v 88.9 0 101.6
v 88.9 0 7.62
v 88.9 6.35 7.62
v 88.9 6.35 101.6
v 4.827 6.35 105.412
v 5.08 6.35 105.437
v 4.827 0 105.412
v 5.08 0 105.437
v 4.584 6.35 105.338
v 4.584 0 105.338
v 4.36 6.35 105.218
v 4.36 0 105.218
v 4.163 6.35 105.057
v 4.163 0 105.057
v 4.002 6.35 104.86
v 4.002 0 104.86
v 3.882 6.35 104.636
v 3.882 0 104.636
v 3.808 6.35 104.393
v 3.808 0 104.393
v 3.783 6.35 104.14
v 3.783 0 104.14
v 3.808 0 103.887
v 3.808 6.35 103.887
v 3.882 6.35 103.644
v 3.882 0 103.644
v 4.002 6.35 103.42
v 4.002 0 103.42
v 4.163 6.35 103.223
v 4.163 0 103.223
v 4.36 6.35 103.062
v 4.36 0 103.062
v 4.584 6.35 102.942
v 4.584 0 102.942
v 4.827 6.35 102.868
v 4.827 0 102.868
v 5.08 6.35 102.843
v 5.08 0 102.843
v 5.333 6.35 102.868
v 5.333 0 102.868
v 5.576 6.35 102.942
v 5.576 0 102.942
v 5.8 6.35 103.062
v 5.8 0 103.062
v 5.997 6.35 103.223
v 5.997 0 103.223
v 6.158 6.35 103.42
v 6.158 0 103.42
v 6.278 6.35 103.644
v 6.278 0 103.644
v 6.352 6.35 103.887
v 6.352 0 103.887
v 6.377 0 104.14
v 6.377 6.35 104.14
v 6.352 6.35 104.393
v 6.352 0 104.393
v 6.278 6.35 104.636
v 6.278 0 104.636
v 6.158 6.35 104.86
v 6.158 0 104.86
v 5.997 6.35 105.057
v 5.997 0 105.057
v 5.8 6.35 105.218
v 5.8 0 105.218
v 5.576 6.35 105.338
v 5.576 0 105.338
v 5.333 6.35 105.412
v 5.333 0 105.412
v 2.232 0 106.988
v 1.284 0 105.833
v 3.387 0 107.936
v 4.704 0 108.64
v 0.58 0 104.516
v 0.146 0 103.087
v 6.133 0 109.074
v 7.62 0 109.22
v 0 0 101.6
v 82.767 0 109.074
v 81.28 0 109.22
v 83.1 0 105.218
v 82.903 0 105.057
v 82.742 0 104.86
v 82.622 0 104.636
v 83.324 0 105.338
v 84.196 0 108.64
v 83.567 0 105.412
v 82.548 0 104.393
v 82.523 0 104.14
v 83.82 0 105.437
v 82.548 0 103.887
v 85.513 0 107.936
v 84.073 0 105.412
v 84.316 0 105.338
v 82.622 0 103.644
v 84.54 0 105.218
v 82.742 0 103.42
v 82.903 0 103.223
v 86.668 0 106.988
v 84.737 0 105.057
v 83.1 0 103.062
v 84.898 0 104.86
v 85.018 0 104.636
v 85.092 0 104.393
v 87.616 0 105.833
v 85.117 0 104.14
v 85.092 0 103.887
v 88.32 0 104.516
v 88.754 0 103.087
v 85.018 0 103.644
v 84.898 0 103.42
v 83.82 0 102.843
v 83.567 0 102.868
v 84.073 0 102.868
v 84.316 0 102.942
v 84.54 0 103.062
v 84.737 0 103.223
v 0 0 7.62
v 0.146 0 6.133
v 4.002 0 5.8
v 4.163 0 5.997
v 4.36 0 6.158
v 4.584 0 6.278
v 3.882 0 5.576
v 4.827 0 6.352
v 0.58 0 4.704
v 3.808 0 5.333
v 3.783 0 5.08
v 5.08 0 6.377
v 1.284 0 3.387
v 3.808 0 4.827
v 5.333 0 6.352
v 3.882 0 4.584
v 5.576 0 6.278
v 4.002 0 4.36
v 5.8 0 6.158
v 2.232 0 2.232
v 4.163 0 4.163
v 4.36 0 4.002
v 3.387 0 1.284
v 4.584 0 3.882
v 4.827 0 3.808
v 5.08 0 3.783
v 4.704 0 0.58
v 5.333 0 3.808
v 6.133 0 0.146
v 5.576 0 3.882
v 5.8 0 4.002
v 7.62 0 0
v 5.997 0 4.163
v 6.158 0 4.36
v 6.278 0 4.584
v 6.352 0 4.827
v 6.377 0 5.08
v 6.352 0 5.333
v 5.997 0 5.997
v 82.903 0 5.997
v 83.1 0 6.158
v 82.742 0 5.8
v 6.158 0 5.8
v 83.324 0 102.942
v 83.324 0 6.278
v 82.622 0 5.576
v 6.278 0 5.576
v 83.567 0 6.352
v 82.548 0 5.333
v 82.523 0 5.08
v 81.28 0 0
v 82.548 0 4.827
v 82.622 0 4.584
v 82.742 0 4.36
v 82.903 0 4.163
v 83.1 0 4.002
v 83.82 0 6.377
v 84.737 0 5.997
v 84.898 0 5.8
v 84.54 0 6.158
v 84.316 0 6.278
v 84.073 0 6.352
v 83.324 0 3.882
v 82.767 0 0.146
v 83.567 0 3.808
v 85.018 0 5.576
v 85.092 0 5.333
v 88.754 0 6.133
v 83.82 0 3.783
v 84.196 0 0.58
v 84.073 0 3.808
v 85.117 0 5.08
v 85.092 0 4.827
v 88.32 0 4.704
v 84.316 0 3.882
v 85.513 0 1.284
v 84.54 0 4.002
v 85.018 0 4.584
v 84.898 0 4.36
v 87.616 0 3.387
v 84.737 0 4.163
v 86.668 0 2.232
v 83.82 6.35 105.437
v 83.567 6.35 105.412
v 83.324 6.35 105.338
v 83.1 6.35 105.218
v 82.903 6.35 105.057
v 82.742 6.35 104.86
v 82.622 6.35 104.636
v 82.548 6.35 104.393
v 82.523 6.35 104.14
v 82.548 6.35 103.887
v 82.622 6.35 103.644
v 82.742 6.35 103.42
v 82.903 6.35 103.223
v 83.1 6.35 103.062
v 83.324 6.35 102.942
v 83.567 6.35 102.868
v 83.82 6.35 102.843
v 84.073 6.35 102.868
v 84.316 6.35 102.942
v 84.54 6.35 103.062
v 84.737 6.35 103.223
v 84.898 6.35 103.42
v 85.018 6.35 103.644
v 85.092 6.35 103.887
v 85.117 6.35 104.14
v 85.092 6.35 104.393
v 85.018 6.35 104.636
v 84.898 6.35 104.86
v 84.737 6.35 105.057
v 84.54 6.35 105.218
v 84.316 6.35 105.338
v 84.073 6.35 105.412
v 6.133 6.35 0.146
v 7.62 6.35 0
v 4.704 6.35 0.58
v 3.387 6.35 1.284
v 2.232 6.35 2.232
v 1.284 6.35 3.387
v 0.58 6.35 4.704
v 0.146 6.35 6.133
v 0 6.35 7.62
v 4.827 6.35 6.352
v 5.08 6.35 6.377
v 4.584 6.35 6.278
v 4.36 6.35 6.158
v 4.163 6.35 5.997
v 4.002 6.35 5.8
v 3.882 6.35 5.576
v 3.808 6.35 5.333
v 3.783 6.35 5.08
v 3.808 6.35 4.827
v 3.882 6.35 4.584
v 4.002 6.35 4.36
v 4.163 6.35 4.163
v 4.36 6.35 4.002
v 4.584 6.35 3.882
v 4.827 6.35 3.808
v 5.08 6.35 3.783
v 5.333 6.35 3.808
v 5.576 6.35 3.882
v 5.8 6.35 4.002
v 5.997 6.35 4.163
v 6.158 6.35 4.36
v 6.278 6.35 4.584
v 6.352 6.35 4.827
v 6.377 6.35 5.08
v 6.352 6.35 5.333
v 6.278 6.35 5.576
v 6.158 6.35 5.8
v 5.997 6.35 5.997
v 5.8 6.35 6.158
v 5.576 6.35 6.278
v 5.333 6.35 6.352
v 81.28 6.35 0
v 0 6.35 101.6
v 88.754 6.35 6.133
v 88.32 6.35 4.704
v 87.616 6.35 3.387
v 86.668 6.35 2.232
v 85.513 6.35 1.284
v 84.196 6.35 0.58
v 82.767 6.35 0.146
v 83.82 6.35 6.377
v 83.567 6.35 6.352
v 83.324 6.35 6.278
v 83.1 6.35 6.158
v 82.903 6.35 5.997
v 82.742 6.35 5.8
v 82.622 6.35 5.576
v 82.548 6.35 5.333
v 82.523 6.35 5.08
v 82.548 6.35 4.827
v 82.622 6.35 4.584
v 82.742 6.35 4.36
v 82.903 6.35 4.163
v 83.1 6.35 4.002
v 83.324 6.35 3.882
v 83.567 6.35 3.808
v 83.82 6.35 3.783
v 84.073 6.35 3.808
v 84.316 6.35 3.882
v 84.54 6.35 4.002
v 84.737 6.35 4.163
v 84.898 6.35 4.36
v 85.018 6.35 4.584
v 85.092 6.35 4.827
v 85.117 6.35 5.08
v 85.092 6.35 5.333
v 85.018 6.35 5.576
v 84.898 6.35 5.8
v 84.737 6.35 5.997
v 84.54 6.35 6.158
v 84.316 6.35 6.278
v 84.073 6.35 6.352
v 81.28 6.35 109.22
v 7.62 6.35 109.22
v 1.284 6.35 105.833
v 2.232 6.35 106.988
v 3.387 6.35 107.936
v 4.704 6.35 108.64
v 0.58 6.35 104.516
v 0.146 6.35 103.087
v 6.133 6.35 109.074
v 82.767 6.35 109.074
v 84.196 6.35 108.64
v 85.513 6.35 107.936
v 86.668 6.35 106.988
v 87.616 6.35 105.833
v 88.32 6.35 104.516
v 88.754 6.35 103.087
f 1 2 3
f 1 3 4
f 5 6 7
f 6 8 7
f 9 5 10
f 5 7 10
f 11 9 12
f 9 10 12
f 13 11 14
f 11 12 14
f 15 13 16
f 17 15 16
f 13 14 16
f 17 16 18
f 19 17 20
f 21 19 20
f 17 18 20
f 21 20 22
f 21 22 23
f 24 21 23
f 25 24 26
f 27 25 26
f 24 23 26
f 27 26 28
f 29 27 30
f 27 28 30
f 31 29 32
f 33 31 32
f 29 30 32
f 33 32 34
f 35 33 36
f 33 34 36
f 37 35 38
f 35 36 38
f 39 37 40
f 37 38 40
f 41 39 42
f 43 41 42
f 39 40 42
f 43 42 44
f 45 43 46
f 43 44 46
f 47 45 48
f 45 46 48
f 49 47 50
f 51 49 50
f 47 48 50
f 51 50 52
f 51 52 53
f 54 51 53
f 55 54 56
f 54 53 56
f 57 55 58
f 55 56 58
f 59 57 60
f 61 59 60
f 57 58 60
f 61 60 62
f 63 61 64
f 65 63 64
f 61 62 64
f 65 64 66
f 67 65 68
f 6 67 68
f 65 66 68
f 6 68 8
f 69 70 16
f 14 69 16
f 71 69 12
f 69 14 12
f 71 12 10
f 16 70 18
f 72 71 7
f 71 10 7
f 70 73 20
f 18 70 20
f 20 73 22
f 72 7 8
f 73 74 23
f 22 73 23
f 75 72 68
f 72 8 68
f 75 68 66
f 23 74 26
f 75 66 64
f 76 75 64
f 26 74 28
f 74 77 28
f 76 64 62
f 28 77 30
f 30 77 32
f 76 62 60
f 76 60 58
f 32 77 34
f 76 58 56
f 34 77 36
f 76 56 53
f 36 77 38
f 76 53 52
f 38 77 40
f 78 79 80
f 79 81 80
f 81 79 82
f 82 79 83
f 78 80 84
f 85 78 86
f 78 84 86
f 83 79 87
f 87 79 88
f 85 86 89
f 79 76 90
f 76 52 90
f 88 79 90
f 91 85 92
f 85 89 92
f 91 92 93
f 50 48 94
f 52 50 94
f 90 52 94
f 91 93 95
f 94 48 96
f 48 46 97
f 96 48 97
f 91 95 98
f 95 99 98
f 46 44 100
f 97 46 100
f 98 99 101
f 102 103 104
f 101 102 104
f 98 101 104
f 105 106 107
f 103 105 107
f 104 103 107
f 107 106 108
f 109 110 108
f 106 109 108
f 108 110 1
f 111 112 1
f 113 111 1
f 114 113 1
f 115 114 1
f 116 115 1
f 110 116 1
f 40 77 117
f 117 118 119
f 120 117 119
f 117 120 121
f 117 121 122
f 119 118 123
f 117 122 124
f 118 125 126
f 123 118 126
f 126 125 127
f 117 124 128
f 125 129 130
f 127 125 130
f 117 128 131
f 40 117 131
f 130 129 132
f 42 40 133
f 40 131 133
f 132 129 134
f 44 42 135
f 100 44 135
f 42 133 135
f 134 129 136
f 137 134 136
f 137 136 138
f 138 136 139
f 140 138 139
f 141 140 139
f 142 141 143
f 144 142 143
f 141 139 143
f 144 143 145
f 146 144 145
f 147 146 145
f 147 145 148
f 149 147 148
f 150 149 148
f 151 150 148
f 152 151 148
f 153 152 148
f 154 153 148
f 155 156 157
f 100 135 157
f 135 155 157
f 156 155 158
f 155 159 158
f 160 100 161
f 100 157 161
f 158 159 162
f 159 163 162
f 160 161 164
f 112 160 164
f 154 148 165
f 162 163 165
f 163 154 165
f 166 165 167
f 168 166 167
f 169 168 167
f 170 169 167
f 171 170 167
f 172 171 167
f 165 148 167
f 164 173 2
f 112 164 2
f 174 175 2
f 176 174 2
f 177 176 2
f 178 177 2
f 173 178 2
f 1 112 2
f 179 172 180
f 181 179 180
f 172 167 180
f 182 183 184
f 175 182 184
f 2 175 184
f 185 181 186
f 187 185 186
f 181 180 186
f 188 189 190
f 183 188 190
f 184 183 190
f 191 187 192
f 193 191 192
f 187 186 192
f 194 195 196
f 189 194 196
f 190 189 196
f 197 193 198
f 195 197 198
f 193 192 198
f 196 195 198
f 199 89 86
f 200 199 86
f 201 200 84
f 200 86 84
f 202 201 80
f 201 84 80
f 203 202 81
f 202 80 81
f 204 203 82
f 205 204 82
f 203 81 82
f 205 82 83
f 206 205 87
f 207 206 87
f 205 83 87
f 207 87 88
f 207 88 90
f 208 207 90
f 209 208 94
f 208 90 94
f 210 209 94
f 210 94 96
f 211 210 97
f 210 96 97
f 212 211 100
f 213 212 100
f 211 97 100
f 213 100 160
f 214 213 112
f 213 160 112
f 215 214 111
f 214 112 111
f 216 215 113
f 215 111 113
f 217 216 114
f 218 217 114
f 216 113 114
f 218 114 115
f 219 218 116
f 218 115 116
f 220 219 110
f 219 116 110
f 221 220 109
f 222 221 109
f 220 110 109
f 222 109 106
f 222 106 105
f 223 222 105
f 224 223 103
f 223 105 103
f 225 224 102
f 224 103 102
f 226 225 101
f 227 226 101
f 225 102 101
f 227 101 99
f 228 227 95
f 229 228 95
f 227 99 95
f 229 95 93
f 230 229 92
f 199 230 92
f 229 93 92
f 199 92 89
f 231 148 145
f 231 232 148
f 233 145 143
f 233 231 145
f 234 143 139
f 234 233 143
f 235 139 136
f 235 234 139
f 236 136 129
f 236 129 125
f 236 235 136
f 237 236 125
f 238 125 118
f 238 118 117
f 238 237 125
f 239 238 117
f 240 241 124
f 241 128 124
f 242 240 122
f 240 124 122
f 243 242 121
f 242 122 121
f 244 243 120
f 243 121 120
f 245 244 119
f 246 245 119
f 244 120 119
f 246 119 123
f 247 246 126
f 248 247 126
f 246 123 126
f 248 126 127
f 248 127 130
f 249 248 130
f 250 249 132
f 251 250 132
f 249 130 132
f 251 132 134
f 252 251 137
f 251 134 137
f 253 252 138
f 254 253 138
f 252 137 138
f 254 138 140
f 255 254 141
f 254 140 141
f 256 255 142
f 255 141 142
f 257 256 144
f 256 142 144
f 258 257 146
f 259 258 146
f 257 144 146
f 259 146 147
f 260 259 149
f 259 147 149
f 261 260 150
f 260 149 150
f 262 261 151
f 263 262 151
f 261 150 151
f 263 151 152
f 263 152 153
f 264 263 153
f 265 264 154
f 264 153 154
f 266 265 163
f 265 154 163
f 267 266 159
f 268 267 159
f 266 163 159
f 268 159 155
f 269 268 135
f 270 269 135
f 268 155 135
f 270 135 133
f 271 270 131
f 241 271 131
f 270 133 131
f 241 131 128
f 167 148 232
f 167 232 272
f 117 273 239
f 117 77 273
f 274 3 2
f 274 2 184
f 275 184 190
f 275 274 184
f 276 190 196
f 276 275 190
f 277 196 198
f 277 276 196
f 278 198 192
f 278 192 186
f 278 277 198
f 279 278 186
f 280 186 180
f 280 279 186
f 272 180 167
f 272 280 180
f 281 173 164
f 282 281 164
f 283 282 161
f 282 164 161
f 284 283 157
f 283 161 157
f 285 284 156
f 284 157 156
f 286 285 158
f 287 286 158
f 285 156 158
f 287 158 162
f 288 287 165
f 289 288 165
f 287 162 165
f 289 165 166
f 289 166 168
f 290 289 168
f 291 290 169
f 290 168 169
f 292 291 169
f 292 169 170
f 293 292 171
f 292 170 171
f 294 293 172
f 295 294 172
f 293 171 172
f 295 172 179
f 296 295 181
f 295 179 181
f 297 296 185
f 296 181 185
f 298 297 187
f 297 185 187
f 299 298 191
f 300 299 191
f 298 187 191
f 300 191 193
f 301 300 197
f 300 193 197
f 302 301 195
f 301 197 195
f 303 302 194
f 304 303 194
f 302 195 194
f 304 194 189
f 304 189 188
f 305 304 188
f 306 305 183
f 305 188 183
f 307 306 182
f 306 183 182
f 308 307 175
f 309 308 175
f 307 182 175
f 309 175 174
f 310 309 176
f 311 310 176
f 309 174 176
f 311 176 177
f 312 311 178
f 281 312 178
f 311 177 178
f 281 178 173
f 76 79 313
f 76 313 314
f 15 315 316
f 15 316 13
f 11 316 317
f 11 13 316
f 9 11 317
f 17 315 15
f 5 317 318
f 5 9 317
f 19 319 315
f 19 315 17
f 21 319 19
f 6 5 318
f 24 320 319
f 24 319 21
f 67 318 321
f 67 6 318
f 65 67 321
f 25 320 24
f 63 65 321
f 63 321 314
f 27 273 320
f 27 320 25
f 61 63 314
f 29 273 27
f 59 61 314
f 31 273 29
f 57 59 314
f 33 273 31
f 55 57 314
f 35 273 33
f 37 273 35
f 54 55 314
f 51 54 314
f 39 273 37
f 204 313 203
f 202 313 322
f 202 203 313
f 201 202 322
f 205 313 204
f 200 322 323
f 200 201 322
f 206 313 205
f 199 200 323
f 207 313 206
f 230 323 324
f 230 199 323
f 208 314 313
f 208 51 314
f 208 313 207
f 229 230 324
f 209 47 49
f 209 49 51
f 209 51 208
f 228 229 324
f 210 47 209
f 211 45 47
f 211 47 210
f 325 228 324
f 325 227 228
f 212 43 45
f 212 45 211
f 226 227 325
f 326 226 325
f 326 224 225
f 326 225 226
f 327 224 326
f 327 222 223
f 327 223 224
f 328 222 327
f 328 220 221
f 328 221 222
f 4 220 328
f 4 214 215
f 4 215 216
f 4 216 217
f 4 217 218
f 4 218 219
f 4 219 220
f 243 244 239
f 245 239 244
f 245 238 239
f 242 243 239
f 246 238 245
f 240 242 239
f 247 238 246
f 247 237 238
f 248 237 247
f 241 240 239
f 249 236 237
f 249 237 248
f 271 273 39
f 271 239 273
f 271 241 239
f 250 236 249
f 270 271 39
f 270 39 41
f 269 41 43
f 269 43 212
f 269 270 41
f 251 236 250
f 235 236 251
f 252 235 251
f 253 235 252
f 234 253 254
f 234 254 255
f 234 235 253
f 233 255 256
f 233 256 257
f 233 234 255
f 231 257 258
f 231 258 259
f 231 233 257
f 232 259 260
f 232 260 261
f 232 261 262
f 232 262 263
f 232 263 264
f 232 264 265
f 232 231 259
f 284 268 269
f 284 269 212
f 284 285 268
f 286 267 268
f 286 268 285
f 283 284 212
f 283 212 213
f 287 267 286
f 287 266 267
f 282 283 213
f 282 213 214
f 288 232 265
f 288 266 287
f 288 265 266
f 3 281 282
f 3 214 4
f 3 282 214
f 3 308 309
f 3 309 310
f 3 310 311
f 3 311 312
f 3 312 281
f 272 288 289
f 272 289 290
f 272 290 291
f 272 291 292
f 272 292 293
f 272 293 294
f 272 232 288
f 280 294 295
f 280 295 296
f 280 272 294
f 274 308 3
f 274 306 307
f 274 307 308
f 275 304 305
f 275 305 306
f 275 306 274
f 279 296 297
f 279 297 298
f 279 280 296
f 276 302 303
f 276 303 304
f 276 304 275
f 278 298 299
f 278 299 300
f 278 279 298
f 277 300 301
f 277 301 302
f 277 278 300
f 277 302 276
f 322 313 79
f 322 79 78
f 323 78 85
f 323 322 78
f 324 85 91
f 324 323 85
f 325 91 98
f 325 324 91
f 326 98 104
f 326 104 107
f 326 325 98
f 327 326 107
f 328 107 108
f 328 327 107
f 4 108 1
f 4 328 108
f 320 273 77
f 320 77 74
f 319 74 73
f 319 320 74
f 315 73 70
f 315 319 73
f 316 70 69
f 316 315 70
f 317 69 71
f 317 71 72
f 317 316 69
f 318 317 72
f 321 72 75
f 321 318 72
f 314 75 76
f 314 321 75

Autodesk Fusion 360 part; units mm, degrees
sketch "Sketch1" plane through (0, 0, 0) normal (0, 1, 0) x (1, 0, 0)
  line L0 (0, 0) -> (88.9, 0)
  line L1 (88.9, 0) -> (88.9, -109.22)
  line L2 (88.9, -109.22) -> (0, -109.22)
  line L3 (0, -109.22) -> (0, 0)
  dimension "d1" = 88.9
  dimension "d2" = 109.22
extrude "Extrude1" add sketch "Sketch1" along normal blind 6.35
fillet "Fillet1" radius 7.62 4 edges at (88.9, 3.175, 0) (0, 3.175, 0) (88.9, 3.175, 109.22) (0, 3.175, 109.22)
sketch "Sketch2" plane through (0, 6.35, 0) normal (0, 1, 0) x (-1, 0, 0)
  arc A0 (0, 101.6) -> (-7.62, 109.22) centre (-7.62, 101.6) ccw
  line L0 (-7.62, 109.22) -> (-81.28, 109.22)
  arc A1 (-81.28, 109.22) -> (-88.9, 101.6) centre (-81.28, 101.6) ccw
  line L1 (-88.9, 101.6) -> (-88.9, 7.62)
  arc A2 (-88.9, 7.62) -> (-81.28, 0) centre (-81.28, 7.62) ccw
  line L2 (-81.28, 0) -> (-7.62, 0)
  arc A3 (-7.62, 0) -> (0, 7.62) centre (-7.62, 7.62) ccw
  line L3 (0, 7.62) -> (0, 101.6)
  line L4 (-63.8008, 109.22) -> (-63.8008, 101.6)
  line L5 (-88.9, 94.0515) -> (-81.28, 94.0515)
  line L6 (-81.28, 101.6) -> (-7.62, 101.6)
  line L7 (-7.62, 101.6) -> (-7.62, 7.62)
  line L8 (-7.62, 7.62) -> (-81.28, 7.62)
  line L9 (-81.28, 7.62) -> (-81.28, 101.6)
  line L10 (-7.62, 7.62) -> (-5.08, 5.08)
hole "Hole1" at (5.08, 6.35, 5.08) direction (0, -1, 0) diameter 3.175 end through all
sketch "Sketch3" plane through (0, 6.35, 0) normal (0, 1, 0) x (-1, 0, 0)
  circle A0 centre (-5.08, 5.08) radius 1.5875
  arc A1 (0, 101.6) -> (-7.62, 109.22) centre (-7.62, 101.6) ccw
  line L0 (-7.62, 109.22) -> (-81.28, 109.22)
  arc A2 (-81.28, 109.22) -> (-88.9, 101.6) centre (-81.28, 101.6) ccw
  line L1 (-88.9, 101.6) -> (-88.9, 7.62)
  arc A3 (-88.9, 7.62) -> (-81.28, 0) centre (-81.28, 7.62) ccw
  line L2 (-81.28, 0) -> (-7.62, 0)
  arc A4 (-7.62, 0) -> (0, 7.62) centre (-7.62, 7.62) ccw
  line L3 (0, 7.62) -> (0, 101.6)
  line L4 (-50.8, 0) -> (-50.8, 7.62)
  line L5 (-88.9, 22.8139) -> (-81.28, 22.8139)
  line L6 (-81.28, 7.62) -> (-7.62, 7.62)
  line L7 (-7.62, 7.62) -> (-7.62, 101.6)
  line L8 (-7.62, 101.6) -> (-81.28, 101.6)
  line L9 (-81.28, 101.6) -> (-81.28, 7.62)
  line L10 (-81.28, 7.62) -> (-83.82, 5.08)
  line L11 (-7.62, 101.6) -> (-5.08, 104.14)
  line L12 (-81.28, 101.6) -> (-83.82, 104.14)
hole "Hole2" at (83.82, 6.35, 5.08) direction (0, -1, 0) diameter 3.175 end through all
sketch "Sketch4" plane through (0, 6.35, 0) normal (0, 1, 0) x (-1, 0, 0)
  circle A0 centre (-83.82, 5.08) radius 1.5875
  circle A1 centre (-5.08, 5.08) radius 1.5875
  arc A2 (0, 101.6) -> (-7.62, 109.22) centre (-7.62, 101.6) ccw
  line L0 (-7.62, 109.22) -> (-81.28, 109.22)
  arc A3 (-81.28, 109.22) -> (-88.9, 101.6) centre (-81.28, 101.6) ccw
  line L1 (-88.9, 101.6) -> (-88.9, 7.62)
  arc A4 (-88.9, 7.62) -> (-81.28, 0) centre (-81.28, 7.62) ccw
  line L2 (-81.28, 0) -> (-7.62, 0)
  arc A5 (-7.62, 0) -> (0, 7.62) centre (-7.62, 7.62) ccw
  line L3 (0, 7.62) -> (0, 101.6)
  line L4 (0, 73.66) -> (-7.62, 73.66)
  line L5 (-28.8405, 109.22) -> (-28.8405, 101.6)
  line L6 (-7.62, 101.6) -> (-81.28, 101.6)
  line L7 (-81.28, 101.6) -> (-81.28, 60.96)
  line L8 (-81.28, 60.96) -> (-7.62, 60.96)
  line L9 (-7.62, 60.96) -> (-7.62, 101.6)
  line L10 (-44.45, 60.96) -> (-44.45, 101.6)
  line L11 (-7.62, 101.6) -> (-5.08, 104.14)
  line L12 (-81.28, 101.6) -> (-83.82, 104.14)
  point P0 (-83.82, 104.14)
  point P1 (-5.08, 104.14)
hole "Hole3" at (5.08, 6.35, 104.14) at (83.82, 6.35, 104.14) direction (0, -1, 0) diameter 3.175 end through all
thread "Thread1" "ANSI Unified Screw Threads 0.125(#5) 5-40 UNC 3B" major diameter 3.175 minor diameter 2.5933 pitch 0.635 angle 60 resizes the face on face at (5.2381, 4.2333, 6.6596) on face at (84.1346, 4.2333, 6.636) on face at (5.2381, 4.2333, 105.7196) on face at (84.2117, 4.2333, 102.6016)
